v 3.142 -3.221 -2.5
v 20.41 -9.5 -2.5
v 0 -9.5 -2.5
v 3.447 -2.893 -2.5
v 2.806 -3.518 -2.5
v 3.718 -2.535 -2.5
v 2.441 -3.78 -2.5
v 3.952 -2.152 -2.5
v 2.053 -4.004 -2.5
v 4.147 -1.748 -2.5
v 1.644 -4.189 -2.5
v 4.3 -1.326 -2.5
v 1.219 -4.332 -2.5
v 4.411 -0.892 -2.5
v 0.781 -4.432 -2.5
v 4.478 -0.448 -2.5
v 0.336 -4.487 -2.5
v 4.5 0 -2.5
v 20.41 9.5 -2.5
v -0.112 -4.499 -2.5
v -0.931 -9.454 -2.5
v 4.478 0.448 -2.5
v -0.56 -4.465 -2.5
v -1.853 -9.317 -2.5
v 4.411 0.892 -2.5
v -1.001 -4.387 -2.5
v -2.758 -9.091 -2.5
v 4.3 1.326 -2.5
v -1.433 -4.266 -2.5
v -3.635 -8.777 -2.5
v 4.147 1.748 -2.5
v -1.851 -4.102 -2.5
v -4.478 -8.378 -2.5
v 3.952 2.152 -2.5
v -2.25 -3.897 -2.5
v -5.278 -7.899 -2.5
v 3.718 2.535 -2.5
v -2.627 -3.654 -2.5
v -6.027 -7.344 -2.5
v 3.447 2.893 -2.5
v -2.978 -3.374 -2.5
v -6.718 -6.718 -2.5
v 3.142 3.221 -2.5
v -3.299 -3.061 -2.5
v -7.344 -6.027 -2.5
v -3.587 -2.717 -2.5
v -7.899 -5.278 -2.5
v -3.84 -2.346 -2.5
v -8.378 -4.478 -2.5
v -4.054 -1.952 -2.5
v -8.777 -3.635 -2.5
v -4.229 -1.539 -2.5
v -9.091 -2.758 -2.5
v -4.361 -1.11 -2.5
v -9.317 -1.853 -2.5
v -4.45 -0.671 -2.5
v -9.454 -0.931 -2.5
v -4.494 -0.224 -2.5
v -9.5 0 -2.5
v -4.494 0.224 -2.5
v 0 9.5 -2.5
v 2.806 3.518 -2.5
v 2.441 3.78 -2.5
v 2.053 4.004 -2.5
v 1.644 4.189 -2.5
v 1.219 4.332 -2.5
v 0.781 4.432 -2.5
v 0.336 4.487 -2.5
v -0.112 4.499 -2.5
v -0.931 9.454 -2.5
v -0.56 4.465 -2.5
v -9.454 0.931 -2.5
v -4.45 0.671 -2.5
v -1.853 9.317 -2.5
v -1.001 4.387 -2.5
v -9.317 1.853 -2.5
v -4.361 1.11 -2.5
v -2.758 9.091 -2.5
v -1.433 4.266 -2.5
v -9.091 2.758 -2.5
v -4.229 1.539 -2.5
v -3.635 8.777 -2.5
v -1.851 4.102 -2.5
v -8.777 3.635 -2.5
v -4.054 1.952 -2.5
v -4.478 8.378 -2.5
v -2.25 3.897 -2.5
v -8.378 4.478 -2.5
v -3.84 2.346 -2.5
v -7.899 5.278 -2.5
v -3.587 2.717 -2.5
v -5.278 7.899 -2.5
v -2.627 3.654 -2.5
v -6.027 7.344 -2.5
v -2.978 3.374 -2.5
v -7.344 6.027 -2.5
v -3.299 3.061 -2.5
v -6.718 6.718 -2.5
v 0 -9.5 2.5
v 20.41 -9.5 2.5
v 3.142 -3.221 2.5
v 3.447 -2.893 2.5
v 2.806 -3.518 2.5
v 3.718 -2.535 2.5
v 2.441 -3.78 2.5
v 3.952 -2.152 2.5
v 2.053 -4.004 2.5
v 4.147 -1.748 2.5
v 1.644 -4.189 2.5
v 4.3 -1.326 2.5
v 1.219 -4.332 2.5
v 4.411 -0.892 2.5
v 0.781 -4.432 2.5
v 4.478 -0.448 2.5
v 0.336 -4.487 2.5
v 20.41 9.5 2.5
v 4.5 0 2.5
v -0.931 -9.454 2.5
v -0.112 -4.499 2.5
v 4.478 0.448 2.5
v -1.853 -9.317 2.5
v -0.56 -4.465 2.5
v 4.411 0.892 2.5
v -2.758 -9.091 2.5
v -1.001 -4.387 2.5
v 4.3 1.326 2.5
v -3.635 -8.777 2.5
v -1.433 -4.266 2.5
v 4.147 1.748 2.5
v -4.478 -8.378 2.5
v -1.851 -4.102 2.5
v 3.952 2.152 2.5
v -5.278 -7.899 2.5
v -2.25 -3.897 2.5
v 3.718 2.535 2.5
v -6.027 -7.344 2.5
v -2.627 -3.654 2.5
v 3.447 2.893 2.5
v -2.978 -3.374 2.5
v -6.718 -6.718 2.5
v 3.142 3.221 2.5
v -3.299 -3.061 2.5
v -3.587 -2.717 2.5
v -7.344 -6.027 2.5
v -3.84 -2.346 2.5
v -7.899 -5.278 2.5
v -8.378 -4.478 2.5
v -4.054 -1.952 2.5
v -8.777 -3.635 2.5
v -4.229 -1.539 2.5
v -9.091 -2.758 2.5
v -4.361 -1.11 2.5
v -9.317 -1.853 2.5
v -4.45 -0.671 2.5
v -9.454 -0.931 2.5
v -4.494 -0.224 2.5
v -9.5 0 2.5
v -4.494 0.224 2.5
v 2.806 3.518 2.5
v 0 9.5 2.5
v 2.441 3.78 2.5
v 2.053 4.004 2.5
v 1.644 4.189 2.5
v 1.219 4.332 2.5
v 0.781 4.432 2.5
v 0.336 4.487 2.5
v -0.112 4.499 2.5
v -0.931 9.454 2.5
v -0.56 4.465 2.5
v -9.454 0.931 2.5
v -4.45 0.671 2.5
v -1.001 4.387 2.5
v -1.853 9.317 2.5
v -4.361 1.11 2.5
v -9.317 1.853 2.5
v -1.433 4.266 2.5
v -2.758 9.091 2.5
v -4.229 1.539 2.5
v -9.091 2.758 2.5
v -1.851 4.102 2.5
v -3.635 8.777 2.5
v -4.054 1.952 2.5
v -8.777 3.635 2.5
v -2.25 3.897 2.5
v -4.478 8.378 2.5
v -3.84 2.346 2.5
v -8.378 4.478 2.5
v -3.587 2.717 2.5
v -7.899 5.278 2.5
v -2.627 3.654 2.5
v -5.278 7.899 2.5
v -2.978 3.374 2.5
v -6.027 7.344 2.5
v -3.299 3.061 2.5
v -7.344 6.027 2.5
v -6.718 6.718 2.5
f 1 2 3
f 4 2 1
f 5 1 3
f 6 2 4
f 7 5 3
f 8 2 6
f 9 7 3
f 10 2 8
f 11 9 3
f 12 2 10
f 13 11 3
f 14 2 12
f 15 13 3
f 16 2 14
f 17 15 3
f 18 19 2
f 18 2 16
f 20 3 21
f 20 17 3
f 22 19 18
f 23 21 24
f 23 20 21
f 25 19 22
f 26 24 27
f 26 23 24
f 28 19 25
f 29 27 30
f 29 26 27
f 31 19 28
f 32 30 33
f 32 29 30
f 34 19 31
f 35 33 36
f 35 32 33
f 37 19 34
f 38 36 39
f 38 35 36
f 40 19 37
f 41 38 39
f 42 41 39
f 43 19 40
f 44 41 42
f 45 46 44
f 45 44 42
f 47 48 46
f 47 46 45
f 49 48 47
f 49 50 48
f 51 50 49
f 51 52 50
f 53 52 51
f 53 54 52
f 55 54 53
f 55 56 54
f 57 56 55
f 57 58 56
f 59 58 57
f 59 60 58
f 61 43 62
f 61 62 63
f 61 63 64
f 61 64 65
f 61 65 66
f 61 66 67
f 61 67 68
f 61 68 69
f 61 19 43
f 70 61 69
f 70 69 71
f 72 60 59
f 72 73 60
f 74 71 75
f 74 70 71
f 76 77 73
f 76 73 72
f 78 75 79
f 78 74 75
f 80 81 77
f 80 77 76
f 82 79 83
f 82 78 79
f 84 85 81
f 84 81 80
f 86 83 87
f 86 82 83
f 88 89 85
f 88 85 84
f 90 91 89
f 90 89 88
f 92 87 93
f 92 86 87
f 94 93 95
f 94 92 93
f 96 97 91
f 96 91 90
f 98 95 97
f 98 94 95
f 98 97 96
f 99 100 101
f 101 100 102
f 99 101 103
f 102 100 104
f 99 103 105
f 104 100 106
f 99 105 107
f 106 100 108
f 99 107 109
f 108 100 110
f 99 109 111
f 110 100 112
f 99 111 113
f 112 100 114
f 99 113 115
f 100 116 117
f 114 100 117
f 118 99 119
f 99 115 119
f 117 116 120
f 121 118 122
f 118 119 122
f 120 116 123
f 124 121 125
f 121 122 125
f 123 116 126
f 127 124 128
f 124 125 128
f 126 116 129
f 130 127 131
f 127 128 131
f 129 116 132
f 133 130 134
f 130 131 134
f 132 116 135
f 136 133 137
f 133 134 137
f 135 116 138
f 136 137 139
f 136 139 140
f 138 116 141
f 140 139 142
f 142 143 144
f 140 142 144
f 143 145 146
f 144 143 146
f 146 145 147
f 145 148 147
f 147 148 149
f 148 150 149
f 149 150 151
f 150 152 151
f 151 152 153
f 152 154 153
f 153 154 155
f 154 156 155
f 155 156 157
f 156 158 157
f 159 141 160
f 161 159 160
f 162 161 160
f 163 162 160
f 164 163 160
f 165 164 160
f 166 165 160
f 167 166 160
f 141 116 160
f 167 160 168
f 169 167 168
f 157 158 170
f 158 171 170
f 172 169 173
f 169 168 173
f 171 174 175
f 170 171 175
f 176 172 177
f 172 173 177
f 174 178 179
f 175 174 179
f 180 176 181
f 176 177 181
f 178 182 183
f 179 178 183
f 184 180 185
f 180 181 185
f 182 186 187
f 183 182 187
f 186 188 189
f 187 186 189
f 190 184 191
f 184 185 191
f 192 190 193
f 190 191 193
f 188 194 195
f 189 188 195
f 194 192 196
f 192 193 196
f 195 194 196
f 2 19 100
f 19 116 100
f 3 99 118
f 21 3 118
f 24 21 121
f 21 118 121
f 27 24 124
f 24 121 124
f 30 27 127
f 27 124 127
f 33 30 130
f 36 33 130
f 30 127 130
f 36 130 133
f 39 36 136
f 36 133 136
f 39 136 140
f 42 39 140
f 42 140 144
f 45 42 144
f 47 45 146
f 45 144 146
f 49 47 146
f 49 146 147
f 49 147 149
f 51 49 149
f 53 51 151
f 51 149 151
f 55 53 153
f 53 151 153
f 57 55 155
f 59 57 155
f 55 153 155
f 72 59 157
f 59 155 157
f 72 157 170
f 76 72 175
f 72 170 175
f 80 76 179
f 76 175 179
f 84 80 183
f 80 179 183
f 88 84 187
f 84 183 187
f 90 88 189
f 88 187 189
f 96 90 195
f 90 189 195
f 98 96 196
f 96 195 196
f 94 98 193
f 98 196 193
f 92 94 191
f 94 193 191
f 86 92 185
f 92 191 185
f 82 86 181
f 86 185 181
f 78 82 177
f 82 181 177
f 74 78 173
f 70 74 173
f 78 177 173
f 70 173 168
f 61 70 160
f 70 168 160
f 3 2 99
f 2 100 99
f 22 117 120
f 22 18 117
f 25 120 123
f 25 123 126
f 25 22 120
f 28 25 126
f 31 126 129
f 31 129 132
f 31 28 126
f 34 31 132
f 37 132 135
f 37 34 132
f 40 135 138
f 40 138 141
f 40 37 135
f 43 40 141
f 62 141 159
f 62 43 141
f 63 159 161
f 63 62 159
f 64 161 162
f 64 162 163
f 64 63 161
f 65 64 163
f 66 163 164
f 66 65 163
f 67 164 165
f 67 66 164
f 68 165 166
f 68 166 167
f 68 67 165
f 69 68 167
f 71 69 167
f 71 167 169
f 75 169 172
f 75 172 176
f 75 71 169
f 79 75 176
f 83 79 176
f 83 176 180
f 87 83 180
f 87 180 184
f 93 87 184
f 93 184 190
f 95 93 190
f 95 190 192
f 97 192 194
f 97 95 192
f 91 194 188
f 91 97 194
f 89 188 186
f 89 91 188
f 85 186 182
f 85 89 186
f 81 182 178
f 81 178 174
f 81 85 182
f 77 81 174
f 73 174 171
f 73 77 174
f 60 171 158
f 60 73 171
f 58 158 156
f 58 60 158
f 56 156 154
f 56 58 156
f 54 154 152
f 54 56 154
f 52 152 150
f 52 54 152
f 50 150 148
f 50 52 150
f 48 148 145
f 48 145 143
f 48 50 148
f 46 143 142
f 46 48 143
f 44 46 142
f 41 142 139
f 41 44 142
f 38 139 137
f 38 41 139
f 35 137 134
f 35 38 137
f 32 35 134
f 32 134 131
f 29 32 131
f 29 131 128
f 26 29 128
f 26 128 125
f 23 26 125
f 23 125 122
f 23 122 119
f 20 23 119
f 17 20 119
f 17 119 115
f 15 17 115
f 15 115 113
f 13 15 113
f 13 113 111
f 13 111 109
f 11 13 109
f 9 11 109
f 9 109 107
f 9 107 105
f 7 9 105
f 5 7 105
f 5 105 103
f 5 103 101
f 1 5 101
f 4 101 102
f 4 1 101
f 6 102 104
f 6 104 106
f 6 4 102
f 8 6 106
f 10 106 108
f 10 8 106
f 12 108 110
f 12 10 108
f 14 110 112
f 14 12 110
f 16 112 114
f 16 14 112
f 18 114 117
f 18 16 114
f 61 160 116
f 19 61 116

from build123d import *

# Parameters (mm, degrees)
SKETCH1_R           = 4.5
BOSS_EXTRUDE1_DEPTH = 2.5


with BuildPart() as part:
    # Sketch1 → Boss-Extrude1 (new, symmetric)
    with BuildSketch(Plane.XY):
        with BuildLine():
            Line((0, 9.5), (20.41, 9.5))
            Line((20.41, 9.5), (20.41, -9.5))
            Line((20.41, -9.5), (0, -9.5))
            ThreePointArc((0, -9.5), (-9.5, 0), (0, 9.5))
        make_face()
        Circle(SKETCH1_R, mode=Mode.SUBTRACT)
    extrude(amount=BOSS_EXTRUDE1_DEPTH, both=True)


solid = part.part
